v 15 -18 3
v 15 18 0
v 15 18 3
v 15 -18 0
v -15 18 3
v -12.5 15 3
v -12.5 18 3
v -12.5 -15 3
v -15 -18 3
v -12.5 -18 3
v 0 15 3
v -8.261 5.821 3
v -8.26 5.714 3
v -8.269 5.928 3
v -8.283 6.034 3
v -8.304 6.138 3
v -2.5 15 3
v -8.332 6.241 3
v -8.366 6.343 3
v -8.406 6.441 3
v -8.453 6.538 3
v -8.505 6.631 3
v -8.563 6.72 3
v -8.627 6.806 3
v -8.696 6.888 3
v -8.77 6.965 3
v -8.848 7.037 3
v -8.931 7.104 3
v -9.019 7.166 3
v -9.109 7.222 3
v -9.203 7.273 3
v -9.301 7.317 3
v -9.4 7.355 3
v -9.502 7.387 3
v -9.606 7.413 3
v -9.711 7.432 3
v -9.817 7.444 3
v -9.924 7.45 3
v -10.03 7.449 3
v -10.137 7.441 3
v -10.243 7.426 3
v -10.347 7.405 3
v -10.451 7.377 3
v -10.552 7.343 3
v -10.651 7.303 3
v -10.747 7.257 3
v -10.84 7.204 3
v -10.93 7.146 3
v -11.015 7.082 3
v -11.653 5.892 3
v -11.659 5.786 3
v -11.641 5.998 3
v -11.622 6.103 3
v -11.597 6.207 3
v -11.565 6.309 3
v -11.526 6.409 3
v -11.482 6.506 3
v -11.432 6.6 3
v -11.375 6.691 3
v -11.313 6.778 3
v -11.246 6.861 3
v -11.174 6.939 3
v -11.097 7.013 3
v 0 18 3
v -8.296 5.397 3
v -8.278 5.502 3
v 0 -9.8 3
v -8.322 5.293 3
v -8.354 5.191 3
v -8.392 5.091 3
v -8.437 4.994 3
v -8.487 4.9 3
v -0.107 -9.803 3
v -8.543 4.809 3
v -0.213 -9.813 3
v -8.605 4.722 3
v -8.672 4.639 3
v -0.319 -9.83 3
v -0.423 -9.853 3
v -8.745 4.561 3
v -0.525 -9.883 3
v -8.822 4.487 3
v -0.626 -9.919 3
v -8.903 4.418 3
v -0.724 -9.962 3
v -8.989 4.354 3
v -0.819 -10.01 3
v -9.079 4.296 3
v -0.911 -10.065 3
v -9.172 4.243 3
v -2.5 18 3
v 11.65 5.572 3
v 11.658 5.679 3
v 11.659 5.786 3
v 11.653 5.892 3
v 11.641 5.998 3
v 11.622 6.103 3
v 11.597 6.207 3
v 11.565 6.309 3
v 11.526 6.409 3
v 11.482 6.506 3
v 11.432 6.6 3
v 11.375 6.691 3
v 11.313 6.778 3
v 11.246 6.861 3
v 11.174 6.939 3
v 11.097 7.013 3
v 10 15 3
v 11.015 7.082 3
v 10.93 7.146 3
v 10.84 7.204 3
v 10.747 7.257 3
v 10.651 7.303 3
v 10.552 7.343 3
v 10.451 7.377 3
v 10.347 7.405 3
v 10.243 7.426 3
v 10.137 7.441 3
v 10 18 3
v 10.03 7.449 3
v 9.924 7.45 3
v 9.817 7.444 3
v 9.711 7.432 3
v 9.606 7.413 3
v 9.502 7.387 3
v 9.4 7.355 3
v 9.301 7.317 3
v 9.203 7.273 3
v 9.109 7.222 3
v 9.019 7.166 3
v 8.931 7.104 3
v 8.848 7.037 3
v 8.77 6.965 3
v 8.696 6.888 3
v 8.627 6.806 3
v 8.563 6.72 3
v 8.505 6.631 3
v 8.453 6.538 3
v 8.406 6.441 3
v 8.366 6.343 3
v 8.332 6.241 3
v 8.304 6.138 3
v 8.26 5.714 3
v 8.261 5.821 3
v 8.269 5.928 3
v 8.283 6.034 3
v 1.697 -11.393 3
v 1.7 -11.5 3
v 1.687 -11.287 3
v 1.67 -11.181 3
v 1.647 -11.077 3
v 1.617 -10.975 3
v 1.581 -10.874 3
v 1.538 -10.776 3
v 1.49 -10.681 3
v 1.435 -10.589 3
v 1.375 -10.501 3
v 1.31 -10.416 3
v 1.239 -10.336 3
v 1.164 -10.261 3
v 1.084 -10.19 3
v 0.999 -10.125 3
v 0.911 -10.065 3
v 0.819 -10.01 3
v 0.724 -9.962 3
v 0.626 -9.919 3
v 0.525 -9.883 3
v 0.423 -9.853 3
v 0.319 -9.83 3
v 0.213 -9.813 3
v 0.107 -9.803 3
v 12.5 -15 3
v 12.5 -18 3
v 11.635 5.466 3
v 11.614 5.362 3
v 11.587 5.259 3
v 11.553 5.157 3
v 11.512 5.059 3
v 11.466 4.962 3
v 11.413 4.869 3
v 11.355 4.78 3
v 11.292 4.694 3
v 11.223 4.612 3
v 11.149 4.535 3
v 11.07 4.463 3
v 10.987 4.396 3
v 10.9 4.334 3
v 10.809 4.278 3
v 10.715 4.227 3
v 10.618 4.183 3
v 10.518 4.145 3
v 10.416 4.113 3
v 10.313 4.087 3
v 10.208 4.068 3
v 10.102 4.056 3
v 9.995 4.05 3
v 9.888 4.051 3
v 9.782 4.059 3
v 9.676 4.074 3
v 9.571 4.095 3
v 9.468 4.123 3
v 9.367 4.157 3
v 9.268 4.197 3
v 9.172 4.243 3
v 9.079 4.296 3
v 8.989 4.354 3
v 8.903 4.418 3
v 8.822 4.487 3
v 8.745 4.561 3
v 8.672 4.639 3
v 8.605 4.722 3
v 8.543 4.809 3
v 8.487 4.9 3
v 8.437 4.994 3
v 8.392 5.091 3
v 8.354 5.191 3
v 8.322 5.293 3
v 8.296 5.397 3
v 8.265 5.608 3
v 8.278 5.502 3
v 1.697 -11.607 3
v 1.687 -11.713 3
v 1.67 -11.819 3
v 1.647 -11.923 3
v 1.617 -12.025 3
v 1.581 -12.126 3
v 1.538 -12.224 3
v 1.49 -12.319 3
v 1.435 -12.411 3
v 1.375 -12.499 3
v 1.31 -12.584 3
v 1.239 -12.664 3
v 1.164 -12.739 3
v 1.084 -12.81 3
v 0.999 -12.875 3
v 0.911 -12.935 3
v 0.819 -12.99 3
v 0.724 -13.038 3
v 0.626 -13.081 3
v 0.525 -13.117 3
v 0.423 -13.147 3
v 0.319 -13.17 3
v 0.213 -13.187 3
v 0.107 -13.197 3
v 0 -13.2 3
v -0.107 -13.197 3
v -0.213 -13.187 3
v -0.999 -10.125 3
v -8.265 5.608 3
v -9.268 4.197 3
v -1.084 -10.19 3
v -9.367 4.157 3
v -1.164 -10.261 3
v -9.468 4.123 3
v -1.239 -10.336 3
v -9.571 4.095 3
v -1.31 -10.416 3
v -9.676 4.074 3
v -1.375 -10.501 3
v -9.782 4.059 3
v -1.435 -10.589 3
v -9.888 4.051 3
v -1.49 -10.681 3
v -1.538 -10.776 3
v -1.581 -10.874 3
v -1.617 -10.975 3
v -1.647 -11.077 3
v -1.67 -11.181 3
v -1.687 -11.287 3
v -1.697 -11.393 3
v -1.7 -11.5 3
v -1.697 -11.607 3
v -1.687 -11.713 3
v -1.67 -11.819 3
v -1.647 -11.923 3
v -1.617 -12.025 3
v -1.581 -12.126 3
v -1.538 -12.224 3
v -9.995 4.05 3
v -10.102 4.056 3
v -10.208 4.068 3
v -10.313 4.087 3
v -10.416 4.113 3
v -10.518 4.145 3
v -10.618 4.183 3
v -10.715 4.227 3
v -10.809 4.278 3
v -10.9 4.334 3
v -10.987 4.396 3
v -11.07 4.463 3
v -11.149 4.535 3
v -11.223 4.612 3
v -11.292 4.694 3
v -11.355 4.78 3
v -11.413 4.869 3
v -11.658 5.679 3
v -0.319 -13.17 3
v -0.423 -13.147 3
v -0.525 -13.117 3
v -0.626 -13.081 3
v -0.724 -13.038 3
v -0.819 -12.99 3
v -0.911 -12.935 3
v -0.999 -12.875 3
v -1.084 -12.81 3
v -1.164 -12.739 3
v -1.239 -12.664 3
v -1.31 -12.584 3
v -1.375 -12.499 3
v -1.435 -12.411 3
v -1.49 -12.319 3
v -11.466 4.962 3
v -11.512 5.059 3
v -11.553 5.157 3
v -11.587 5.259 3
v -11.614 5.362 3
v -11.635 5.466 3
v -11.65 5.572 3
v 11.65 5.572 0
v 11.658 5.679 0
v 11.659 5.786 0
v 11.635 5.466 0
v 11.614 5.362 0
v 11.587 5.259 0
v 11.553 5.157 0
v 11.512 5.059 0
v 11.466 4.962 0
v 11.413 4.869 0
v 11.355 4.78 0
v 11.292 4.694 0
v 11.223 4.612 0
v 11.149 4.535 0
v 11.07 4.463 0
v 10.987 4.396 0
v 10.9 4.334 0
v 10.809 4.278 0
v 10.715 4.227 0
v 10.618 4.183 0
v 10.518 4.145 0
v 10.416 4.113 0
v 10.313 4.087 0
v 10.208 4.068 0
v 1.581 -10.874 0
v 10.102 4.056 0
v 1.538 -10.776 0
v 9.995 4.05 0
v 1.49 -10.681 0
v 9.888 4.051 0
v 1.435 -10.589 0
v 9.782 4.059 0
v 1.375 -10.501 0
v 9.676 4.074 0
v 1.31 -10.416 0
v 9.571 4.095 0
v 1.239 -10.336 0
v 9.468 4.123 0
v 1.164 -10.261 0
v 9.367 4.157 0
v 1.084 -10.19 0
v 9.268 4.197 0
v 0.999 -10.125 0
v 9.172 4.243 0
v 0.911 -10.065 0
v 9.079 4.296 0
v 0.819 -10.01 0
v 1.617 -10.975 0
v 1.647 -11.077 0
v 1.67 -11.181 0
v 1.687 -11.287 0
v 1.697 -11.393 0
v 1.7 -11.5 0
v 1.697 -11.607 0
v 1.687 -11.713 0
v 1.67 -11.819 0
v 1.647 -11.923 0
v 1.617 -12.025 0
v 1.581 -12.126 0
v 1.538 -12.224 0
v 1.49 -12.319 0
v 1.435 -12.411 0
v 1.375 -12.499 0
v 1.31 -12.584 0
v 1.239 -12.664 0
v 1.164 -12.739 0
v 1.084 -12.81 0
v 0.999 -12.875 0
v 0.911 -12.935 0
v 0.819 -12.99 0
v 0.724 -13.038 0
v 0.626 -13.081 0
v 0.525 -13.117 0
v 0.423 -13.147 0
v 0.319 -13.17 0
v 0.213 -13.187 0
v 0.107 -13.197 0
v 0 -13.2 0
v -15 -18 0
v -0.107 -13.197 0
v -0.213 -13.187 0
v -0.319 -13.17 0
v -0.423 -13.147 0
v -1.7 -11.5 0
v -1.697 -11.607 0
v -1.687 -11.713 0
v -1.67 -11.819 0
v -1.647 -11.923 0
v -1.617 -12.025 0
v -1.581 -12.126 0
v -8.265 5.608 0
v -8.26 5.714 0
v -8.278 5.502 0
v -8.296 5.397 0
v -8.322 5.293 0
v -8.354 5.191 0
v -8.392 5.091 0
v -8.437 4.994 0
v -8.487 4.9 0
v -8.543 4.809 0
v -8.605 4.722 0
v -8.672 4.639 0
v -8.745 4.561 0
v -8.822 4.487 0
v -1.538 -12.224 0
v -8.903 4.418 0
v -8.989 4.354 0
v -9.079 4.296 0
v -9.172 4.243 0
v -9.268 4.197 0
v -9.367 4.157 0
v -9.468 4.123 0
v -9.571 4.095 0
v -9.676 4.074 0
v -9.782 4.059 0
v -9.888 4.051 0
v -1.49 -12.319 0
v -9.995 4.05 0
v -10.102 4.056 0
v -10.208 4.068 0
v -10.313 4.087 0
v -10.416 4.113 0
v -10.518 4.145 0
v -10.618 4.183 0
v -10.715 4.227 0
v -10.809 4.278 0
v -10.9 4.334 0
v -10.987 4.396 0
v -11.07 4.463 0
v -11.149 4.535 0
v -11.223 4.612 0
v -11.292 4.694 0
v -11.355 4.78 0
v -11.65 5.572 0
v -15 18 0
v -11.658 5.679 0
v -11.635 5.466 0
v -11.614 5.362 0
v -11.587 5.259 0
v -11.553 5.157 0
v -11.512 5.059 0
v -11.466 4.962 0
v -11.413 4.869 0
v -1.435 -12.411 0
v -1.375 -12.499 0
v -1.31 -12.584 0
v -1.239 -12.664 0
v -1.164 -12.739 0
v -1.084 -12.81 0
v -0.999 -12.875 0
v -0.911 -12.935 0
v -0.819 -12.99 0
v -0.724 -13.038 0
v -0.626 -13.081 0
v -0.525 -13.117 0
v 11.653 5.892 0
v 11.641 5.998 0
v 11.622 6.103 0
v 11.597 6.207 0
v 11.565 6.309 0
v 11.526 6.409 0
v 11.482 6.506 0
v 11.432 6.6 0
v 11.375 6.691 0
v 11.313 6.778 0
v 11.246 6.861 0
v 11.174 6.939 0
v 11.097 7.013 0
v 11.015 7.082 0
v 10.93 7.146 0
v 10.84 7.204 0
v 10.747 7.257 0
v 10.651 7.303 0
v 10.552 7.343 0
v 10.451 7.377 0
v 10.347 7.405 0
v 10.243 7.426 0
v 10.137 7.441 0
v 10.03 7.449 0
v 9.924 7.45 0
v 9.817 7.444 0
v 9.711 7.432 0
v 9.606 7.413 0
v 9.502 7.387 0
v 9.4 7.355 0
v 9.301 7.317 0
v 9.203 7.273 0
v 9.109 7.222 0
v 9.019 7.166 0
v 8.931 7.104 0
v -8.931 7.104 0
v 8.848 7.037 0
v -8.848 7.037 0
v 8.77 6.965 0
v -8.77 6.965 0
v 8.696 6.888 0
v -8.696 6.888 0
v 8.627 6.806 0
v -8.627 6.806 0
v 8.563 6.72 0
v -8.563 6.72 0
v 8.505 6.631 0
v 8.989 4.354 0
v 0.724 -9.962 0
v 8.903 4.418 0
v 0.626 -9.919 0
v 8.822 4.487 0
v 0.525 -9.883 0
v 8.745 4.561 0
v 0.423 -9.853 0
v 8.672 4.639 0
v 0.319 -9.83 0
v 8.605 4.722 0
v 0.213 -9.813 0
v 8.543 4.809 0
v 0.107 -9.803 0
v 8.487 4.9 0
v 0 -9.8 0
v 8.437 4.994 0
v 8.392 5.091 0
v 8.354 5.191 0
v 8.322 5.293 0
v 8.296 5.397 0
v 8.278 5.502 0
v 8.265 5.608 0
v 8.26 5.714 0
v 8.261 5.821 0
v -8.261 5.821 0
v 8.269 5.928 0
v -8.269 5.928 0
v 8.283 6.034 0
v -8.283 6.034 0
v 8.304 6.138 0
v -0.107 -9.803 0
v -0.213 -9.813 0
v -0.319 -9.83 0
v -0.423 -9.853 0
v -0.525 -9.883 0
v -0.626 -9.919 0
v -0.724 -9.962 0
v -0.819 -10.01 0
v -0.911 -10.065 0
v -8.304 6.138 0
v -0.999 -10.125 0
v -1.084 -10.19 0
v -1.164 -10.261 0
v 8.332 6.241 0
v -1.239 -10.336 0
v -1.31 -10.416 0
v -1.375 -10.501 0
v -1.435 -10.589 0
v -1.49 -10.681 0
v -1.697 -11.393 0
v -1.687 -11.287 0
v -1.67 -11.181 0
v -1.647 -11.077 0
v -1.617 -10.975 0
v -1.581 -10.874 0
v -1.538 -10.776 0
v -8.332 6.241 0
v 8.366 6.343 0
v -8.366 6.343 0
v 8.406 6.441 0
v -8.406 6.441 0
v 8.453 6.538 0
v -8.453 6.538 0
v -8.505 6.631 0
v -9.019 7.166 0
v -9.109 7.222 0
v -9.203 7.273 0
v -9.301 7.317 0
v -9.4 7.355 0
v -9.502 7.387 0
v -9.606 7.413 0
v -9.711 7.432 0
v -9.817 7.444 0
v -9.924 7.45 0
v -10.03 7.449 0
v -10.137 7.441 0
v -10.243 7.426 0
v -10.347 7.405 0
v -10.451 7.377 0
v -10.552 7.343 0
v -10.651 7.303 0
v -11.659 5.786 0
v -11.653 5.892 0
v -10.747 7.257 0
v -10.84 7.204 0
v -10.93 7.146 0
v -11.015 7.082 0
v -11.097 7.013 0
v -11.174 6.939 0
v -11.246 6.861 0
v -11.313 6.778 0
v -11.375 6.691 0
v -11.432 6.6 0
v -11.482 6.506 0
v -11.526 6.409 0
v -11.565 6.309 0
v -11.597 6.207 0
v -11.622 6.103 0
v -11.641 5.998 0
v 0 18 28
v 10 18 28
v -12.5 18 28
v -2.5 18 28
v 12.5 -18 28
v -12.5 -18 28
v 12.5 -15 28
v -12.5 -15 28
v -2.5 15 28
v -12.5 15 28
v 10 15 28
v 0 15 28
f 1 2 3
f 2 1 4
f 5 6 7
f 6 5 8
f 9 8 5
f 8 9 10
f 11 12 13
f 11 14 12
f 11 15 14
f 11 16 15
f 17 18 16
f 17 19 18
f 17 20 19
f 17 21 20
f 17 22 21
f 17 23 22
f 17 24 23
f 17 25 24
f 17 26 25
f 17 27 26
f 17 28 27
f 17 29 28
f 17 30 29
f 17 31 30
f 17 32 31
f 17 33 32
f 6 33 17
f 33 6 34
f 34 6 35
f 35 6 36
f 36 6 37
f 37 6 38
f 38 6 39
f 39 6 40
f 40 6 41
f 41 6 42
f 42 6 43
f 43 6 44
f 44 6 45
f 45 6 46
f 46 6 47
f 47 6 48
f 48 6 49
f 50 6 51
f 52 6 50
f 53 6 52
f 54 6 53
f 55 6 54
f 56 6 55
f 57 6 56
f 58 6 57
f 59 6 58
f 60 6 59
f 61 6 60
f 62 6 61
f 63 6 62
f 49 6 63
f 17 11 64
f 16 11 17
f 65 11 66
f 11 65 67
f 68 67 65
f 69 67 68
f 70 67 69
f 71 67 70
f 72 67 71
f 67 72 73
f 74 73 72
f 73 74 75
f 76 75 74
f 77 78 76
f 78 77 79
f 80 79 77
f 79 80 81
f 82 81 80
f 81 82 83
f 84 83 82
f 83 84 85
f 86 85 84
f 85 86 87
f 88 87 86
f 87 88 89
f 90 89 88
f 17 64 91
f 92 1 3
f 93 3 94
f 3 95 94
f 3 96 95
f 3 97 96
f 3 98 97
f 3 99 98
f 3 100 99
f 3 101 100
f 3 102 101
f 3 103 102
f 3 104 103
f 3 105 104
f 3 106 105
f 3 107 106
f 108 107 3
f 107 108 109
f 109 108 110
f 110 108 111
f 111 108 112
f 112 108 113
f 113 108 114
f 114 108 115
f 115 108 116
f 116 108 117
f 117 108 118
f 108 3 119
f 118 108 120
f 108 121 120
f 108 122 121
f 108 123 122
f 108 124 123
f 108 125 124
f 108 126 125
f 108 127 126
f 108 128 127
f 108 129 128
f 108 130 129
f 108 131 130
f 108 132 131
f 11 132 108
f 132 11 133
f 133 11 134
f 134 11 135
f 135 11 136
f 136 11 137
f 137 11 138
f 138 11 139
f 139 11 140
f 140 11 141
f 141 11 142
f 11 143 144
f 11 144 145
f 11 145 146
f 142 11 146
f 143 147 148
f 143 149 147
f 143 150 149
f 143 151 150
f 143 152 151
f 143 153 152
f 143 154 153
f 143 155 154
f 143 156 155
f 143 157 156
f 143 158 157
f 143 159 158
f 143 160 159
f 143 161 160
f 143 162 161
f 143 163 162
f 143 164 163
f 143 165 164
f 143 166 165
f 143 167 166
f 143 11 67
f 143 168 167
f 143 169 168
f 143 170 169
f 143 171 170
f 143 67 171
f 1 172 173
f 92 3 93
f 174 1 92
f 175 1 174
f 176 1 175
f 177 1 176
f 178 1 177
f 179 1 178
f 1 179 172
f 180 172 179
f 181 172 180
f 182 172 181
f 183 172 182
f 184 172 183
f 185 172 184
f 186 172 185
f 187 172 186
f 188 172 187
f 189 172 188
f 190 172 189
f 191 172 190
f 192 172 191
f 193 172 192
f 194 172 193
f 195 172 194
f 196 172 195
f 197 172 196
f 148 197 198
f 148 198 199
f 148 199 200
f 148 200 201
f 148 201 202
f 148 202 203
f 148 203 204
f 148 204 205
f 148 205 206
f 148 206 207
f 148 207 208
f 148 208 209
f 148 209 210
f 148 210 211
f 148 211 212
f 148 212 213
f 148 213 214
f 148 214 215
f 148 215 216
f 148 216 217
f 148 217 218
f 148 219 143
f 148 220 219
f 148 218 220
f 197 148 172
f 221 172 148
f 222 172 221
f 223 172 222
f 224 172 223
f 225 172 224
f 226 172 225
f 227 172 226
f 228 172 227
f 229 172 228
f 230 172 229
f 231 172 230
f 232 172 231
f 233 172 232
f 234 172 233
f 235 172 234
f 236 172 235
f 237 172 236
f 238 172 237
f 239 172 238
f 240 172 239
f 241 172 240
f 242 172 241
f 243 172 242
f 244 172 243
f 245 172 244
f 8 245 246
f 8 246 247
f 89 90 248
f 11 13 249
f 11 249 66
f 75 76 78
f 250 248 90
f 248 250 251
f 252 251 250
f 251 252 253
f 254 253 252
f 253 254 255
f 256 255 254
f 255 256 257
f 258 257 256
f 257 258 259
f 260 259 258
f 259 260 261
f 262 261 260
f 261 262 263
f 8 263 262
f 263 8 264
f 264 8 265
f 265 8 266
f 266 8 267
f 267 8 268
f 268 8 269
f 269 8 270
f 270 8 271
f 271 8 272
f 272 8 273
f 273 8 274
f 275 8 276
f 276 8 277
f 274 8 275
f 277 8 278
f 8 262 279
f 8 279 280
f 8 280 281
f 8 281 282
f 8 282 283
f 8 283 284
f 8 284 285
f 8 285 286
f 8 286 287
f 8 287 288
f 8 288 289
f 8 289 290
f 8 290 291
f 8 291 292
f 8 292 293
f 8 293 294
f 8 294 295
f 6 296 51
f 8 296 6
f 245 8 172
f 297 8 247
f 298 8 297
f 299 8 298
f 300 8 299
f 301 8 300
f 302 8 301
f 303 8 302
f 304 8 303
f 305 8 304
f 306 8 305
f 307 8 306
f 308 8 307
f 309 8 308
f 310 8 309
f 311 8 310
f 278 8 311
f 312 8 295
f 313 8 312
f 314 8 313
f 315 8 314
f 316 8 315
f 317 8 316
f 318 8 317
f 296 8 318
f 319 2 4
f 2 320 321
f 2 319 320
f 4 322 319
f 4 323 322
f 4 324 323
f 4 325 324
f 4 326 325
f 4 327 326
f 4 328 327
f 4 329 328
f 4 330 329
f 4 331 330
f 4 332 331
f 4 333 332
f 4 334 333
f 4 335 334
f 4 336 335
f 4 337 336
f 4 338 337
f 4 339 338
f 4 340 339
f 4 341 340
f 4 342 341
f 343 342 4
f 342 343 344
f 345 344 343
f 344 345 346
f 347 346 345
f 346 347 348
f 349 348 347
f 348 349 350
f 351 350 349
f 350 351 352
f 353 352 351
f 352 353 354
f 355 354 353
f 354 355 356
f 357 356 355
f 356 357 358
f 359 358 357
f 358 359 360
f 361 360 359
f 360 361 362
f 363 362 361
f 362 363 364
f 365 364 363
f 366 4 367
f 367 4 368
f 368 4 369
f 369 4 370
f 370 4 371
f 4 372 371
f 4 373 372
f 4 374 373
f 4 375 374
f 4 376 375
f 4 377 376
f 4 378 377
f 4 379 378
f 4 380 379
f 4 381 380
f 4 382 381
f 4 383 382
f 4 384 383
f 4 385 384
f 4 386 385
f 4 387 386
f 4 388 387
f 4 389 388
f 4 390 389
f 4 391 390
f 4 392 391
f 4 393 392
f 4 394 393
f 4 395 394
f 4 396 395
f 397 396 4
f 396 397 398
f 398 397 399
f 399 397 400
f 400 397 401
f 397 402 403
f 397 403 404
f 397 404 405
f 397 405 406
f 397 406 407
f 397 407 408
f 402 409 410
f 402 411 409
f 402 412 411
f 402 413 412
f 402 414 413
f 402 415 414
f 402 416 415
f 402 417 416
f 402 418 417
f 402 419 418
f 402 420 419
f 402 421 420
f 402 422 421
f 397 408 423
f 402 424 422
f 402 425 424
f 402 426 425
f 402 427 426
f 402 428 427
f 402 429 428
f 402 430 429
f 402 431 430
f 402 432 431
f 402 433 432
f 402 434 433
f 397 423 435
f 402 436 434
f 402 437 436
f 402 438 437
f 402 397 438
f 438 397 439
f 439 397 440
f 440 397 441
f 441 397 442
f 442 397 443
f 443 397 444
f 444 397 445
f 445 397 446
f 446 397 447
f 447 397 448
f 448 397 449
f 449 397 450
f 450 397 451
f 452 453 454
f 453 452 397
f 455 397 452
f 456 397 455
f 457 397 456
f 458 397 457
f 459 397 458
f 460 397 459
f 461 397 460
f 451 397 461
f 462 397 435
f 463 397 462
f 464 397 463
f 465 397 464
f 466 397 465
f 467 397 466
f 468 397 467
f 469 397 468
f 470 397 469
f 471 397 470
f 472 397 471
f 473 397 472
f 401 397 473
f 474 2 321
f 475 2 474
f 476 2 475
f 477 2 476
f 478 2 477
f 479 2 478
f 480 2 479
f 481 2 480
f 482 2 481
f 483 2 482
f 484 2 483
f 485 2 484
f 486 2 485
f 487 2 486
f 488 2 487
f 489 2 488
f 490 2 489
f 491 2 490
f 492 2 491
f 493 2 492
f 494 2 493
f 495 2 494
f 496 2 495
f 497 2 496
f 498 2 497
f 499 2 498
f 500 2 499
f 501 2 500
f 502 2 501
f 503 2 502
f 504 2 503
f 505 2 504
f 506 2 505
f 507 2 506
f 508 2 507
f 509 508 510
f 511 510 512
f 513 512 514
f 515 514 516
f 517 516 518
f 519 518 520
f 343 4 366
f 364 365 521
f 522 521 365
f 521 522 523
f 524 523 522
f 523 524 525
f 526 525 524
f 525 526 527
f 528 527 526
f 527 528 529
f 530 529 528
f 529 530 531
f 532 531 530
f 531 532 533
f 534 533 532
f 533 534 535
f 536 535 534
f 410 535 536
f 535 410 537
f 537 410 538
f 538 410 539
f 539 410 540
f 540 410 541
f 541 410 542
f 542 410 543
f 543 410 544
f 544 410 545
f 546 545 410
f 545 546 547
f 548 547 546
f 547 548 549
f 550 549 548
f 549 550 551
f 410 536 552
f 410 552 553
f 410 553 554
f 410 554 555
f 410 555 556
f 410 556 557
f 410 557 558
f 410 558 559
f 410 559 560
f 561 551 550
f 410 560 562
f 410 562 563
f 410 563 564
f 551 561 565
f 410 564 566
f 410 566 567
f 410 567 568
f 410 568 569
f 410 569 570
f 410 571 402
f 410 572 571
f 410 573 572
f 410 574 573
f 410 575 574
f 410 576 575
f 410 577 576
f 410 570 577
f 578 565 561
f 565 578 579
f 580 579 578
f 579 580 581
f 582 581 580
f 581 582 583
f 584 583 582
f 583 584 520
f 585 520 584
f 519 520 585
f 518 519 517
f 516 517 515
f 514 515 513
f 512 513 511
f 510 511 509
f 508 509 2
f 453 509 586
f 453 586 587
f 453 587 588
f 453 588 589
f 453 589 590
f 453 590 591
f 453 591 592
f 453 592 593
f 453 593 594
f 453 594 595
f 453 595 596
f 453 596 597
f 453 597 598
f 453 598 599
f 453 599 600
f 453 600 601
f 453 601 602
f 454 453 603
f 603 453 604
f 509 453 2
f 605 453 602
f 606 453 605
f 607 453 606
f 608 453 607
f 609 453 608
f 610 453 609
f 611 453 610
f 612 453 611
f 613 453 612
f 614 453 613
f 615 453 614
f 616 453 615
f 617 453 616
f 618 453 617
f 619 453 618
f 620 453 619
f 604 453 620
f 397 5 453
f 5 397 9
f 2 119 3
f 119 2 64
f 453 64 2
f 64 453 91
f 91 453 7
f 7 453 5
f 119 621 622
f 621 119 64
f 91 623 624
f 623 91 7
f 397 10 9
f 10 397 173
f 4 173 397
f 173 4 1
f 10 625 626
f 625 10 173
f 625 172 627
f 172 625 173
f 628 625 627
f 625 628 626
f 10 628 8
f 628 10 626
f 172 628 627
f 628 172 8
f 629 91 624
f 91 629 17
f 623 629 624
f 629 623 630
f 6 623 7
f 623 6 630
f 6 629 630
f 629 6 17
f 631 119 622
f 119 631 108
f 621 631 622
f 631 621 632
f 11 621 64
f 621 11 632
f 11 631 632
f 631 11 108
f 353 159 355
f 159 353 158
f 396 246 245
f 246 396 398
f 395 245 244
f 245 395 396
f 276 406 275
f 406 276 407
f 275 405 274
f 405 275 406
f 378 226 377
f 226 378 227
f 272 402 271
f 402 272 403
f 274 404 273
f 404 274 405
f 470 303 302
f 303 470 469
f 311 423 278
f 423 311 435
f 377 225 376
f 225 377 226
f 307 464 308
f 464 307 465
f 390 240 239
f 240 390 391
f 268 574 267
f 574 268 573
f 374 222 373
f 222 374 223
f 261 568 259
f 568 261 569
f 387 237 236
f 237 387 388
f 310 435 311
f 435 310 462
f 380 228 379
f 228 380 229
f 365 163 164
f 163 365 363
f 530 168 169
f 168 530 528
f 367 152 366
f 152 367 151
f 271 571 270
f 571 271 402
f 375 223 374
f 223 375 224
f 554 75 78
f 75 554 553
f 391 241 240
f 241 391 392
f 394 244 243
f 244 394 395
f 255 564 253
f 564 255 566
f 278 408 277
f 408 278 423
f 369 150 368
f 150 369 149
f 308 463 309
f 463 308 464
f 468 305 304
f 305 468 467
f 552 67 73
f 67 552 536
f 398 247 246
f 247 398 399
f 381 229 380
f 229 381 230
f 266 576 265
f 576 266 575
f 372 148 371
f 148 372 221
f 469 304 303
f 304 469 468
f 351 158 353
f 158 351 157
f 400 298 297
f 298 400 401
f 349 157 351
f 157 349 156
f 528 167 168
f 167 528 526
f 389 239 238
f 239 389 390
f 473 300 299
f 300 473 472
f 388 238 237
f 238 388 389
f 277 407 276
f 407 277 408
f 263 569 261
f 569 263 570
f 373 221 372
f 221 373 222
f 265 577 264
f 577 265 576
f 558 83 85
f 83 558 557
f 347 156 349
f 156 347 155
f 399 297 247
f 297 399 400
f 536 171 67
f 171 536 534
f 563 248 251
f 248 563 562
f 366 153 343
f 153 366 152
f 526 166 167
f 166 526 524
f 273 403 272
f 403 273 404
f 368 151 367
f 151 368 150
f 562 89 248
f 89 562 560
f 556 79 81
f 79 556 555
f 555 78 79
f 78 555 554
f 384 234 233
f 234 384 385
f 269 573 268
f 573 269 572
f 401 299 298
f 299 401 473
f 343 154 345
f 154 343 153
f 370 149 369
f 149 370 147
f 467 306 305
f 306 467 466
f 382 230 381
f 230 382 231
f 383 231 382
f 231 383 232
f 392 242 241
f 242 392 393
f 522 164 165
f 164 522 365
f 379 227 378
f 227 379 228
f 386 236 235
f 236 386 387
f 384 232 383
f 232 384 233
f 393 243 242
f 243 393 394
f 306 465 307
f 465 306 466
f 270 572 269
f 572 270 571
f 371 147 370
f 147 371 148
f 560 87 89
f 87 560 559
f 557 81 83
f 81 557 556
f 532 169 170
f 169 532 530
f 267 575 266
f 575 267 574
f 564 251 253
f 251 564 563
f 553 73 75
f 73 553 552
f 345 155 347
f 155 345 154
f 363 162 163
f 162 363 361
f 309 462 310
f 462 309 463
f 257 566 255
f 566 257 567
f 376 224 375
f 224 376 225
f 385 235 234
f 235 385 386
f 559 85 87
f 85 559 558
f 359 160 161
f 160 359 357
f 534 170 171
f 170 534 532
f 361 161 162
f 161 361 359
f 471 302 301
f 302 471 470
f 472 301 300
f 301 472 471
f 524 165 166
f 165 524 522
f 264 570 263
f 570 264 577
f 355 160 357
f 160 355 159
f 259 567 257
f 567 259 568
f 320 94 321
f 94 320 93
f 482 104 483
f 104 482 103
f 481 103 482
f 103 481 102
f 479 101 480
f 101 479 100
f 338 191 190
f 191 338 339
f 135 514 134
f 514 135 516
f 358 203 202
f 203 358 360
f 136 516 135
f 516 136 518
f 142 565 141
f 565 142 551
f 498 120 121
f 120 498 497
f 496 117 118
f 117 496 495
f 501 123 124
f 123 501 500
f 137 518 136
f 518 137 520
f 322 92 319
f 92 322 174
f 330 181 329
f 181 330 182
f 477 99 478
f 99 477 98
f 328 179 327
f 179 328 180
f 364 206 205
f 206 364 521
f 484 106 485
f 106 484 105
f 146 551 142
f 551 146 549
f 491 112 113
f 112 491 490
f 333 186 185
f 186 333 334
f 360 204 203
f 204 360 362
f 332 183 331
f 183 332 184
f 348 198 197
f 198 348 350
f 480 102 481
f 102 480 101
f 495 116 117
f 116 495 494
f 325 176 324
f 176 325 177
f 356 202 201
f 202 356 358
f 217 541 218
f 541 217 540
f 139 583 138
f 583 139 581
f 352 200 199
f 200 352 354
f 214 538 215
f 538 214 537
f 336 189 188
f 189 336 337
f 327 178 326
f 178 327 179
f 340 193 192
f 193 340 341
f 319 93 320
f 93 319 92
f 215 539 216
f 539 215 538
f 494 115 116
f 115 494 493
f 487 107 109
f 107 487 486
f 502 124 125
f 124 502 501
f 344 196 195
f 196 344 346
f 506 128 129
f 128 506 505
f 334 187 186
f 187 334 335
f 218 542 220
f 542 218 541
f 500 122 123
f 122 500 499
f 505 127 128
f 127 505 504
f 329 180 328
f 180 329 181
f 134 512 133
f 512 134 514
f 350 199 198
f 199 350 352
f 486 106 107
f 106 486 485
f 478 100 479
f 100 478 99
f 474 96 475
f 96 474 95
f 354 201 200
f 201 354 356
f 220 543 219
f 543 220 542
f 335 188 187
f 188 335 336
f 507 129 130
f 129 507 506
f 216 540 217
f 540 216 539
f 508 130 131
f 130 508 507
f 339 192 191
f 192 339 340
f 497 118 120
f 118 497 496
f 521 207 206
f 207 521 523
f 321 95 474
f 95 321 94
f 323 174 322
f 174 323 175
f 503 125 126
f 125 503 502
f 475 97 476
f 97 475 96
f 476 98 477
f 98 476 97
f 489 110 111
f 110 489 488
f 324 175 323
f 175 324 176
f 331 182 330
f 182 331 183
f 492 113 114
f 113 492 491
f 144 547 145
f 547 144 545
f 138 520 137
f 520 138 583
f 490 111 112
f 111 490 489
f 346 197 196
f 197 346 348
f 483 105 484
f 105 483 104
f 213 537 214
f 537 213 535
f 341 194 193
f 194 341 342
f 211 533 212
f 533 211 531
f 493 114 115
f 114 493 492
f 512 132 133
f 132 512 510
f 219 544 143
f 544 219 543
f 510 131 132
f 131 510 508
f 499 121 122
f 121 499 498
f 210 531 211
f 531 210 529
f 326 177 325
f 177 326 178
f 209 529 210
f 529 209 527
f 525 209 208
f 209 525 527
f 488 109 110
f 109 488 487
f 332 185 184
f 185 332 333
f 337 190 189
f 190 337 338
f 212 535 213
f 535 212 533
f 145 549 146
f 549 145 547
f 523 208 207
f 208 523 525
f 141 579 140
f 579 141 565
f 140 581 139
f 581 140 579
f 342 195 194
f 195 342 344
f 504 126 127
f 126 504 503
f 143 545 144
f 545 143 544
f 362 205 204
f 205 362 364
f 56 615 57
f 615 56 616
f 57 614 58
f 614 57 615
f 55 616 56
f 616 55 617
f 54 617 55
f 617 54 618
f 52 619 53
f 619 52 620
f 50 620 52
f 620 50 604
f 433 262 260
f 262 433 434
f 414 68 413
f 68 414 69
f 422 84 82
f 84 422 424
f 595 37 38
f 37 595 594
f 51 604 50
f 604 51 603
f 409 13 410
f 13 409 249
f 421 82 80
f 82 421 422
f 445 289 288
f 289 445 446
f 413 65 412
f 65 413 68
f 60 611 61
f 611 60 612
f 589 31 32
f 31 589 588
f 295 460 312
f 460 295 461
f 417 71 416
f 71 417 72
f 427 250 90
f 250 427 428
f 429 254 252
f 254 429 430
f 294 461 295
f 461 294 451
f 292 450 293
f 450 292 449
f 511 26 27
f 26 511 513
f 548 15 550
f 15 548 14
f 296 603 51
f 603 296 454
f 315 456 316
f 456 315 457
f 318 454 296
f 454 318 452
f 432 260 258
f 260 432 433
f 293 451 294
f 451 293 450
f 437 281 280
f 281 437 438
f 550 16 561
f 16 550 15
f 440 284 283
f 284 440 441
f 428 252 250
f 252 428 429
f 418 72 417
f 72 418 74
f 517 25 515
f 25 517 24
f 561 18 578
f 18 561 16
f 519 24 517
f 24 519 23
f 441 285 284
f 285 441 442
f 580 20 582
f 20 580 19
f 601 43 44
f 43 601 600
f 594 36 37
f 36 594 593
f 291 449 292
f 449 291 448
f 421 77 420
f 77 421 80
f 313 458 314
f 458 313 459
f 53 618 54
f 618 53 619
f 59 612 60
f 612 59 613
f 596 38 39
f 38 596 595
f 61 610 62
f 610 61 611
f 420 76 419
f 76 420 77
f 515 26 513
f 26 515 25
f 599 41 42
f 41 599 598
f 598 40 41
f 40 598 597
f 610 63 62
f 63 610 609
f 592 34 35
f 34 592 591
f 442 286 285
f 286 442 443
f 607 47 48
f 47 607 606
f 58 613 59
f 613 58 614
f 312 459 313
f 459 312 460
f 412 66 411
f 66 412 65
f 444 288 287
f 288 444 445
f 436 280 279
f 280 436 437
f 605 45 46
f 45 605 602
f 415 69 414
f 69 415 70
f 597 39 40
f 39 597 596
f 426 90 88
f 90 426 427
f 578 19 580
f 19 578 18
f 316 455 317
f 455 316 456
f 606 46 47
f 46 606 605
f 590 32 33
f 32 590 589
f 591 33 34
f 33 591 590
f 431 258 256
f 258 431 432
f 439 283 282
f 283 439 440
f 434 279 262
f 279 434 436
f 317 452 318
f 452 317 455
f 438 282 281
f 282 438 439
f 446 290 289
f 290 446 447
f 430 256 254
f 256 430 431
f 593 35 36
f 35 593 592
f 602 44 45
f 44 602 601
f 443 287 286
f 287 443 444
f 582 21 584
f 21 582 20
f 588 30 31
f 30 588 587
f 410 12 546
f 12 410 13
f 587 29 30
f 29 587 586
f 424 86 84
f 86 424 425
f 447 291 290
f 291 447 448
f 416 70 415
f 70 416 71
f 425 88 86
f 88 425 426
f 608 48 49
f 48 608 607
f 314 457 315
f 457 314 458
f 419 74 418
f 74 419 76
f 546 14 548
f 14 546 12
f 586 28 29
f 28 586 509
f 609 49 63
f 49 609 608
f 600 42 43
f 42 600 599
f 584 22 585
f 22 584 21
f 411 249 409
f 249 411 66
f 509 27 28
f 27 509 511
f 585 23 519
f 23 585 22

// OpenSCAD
difference(){
	union(){
      translate([-30/2,-36/2,0]){
            cube([30,36,3], center=false);
      }
      translate([-30/2+2.5,-36/2,0]){
            cube([25,3,28], center=false);
      }
      translate([-30/2+2.5,36/2-3,0]){
            cube([10,3,28], center=false);
      }
      translate([-30/2+15,36/2-3,0]){
            cube([10,3,28], center=false);
      }


	}
	union() {

        translate([0,0,-1]){
            rotate([0,0,0-90]){
                translate([11.5,0,0]){
                    cylinder(h=500, r=1.7, $fn=100, center=false);
                }
            }
            rotate([0,0,120-90]){
                translate([11.5,0,0]){
                    cylinder(h=500, r=1.7, $fn=100, center=false);
                }
            }
            rotate([0,0,240-90]){
                translate([11.5,0,0]){
                    cylinder(h=500, r=1.7, $fn=100, center=false);
                }
            }
        } 



    

      
	}
}
